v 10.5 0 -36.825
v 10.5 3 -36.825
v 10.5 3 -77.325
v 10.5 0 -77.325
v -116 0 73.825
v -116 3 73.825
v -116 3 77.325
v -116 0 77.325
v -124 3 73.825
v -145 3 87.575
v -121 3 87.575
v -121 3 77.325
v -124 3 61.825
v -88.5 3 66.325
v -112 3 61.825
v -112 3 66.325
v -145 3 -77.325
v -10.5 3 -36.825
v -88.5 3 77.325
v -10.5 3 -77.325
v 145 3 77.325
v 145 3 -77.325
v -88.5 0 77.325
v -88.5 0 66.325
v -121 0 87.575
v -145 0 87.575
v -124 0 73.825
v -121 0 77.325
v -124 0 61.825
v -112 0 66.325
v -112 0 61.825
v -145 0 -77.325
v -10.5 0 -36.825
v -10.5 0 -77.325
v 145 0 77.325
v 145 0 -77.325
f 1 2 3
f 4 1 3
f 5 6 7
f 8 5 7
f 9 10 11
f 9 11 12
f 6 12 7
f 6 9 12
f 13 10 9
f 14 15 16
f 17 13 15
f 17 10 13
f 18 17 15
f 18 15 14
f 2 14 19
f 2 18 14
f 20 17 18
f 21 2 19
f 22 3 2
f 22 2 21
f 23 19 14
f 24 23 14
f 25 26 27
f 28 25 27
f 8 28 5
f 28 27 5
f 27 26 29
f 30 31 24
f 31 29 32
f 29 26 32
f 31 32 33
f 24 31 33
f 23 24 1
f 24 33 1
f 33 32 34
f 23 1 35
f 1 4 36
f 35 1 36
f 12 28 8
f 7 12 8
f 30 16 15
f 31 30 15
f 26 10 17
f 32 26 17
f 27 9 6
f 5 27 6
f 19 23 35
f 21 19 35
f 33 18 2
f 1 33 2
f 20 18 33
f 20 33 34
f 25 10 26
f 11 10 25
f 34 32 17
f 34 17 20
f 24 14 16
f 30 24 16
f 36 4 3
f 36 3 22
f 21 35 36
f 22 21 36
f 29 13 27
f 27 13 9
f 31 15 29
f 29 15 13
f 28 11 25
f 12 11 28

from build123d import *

# Parameters (mm, degrees)
SKETCH1_W           = 290
SKETCH1_H           = 154.65
BOSS_EXTRUDE1_DEPTH = 3
SKETCH2_W           = 21
SKETCH2_H           = 40.5
CUT_EXTRUDE1_DEPTH  = 165.356793669
CUT_EXTRUDE2_DEPTH  = 165.356793669
SKETCH4_W           = 24
SKETCH4_H           = 10.25
BOSS_EXTRUDE2_DEPTH = 3


with BuildPart() as part:
    # Sketch1 → Boss-Extrude1 (new body)
    with BuildSketch(Plane(origin=(0, 0, 0), x_dir=(1, 0, 0), z_dir=(0, 1, 0))):
        Rectangle(SKETCH1_W, SKETCH1_H)
    extrude(amount=BOSS_EXTRUDE1_DEPTH)

    # Sketch2 → Cut-Extrude1 (cut, through all)
    with BuildSketch(Plane(origin=(0, 3, 0), x_dir=(1, 0, 0), z_dir=(0, 1, 0))):
        with Locations((0, 57.075)):
            Rectangle(SKETCH2_W, SKETCH2_H)
    extrude(amount=-CUT_EXTRUDE1_DEPTH, mode=Mode.SUBTRACT)

    # Sketch3 → Cut-Extrude2 (cut, through all)
    with BuildSketch(Plane(origin=(0, 3, 0), x_dir=(1, 0, 0), z_dir=(0, 1, 0))):
        Polygon((-116, -73.825), (-116, -77.325), (-88.5, -77.325), (-88.5, -66.325), (-112, -66.325), (-112, -61.825), (-124, -61.825), (-124, -73.825), align=None)
    extrude(amount=-CUT_EXTRUDE2_DEPTH, mode=Mode.SUBTRACT)

    # Sketch4 → Boss-Extrude2 (add, through all)
    with BuildSketch(Plane(origin=(0, 3, 0), x_dir=(1, 0, 0), z_dir=(0, 1, 0))):
        with Locations((-133, -82.45)):
            Rectangle(SKETCH4_W, SKETCH4_H)
    extrude(amount=-BOSS_EXTRUDE2_DEPTH)


solid = part.part
